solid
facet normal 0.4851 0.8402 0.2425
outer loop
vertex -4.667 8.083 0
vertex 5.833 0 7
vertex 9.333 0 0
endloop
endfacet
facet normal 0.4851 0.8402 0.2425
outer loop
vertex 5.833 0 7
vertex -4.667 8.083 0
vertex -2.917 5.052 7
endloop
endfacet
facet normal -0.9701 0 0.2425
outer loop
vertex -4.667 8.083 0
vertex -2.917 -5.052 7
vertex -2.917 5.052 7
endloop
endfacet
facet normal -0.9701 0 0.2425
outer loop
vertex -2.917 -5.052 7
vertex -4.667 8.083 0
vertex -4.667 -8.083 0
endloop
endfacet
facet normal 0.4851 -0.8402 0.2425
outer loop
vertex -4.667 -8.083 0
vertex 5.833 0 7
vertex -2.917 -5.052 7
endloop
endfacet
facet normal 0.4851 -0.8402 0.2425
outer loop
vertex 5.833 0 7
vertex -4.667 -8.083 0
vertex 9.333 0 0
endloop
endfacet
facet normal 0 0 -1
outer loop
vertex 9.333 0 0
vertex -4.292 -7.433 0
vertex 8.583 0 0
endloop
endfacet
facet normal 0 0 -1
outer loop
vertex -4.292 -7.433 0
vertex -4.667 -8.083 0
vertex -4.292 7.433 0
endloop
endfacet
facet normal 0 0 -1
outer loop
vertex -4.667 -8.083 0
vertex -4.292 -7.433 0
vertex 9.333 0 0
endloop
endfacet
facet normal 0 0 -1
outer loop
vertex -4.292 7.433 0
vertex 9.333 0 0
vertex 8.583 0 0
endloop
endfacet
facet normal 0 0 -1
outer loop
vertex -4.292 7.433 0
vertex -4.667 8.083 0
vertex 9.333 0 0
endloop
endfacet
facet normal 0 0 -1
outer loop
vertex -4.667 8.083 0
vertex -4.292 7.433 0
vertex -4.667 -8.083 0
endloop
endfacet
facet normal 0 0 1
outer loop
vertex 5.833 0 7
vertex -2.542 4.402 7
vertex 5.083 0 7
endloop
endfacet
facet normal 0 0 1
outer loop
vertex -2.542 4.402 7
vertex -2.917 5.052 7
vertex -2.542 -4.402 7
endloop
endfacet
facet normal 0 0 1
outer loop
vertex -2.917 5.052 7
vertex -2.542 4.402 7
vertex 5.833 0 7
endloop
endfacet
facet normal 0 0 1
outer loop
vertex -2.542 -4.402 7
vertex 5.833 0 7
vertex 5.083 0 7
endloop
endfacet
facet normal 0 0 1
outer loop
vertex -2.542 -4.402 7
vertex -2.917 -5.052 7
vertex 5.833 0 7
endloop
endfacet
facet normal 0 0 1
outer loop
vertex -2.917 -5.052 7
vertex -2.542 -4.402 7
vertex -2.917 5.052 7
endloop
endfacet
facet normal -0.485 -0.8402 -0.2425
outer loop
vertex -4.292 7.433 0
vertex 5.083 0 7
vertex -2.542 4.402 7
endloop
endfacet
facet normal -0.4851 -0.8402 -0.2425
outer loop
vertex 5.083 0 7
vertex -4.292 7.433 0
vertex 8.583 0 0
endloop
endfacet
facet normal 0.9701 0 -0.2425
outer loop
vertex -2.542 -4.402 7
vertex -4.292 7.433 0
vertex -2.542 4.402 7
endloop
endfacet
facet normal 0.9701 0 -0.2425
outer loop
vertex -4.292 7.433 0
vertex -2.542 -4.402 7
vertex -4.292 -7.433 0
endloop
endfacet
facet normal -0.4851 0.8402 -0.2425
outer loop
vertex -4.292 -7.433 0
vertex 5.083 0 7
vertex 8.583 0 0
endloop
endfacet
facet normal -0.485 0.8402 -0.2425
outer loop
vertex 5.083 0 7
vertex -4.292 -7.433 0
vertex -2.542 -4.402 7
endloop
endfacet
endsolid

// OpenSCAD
// Created by IndiePandaaaaa|Lukas

TOLERANCE = 0.1;
THICKNESS = 1.5;

HEIGHT = 7;
WIDTH = 14;

SIZE = WIDTH * 4/3;

module pyramid(size = 30) {
    cylinder(d1 = size, d2 = 0, h = size, $fn = 3);
}

difference() {
    pyramid(SIZE);
    translate([0, 0, HEIGHT]) pyramid(SIZE);
    translate([0,0,-THICKNESS]) pyramid(SIZE);
}
